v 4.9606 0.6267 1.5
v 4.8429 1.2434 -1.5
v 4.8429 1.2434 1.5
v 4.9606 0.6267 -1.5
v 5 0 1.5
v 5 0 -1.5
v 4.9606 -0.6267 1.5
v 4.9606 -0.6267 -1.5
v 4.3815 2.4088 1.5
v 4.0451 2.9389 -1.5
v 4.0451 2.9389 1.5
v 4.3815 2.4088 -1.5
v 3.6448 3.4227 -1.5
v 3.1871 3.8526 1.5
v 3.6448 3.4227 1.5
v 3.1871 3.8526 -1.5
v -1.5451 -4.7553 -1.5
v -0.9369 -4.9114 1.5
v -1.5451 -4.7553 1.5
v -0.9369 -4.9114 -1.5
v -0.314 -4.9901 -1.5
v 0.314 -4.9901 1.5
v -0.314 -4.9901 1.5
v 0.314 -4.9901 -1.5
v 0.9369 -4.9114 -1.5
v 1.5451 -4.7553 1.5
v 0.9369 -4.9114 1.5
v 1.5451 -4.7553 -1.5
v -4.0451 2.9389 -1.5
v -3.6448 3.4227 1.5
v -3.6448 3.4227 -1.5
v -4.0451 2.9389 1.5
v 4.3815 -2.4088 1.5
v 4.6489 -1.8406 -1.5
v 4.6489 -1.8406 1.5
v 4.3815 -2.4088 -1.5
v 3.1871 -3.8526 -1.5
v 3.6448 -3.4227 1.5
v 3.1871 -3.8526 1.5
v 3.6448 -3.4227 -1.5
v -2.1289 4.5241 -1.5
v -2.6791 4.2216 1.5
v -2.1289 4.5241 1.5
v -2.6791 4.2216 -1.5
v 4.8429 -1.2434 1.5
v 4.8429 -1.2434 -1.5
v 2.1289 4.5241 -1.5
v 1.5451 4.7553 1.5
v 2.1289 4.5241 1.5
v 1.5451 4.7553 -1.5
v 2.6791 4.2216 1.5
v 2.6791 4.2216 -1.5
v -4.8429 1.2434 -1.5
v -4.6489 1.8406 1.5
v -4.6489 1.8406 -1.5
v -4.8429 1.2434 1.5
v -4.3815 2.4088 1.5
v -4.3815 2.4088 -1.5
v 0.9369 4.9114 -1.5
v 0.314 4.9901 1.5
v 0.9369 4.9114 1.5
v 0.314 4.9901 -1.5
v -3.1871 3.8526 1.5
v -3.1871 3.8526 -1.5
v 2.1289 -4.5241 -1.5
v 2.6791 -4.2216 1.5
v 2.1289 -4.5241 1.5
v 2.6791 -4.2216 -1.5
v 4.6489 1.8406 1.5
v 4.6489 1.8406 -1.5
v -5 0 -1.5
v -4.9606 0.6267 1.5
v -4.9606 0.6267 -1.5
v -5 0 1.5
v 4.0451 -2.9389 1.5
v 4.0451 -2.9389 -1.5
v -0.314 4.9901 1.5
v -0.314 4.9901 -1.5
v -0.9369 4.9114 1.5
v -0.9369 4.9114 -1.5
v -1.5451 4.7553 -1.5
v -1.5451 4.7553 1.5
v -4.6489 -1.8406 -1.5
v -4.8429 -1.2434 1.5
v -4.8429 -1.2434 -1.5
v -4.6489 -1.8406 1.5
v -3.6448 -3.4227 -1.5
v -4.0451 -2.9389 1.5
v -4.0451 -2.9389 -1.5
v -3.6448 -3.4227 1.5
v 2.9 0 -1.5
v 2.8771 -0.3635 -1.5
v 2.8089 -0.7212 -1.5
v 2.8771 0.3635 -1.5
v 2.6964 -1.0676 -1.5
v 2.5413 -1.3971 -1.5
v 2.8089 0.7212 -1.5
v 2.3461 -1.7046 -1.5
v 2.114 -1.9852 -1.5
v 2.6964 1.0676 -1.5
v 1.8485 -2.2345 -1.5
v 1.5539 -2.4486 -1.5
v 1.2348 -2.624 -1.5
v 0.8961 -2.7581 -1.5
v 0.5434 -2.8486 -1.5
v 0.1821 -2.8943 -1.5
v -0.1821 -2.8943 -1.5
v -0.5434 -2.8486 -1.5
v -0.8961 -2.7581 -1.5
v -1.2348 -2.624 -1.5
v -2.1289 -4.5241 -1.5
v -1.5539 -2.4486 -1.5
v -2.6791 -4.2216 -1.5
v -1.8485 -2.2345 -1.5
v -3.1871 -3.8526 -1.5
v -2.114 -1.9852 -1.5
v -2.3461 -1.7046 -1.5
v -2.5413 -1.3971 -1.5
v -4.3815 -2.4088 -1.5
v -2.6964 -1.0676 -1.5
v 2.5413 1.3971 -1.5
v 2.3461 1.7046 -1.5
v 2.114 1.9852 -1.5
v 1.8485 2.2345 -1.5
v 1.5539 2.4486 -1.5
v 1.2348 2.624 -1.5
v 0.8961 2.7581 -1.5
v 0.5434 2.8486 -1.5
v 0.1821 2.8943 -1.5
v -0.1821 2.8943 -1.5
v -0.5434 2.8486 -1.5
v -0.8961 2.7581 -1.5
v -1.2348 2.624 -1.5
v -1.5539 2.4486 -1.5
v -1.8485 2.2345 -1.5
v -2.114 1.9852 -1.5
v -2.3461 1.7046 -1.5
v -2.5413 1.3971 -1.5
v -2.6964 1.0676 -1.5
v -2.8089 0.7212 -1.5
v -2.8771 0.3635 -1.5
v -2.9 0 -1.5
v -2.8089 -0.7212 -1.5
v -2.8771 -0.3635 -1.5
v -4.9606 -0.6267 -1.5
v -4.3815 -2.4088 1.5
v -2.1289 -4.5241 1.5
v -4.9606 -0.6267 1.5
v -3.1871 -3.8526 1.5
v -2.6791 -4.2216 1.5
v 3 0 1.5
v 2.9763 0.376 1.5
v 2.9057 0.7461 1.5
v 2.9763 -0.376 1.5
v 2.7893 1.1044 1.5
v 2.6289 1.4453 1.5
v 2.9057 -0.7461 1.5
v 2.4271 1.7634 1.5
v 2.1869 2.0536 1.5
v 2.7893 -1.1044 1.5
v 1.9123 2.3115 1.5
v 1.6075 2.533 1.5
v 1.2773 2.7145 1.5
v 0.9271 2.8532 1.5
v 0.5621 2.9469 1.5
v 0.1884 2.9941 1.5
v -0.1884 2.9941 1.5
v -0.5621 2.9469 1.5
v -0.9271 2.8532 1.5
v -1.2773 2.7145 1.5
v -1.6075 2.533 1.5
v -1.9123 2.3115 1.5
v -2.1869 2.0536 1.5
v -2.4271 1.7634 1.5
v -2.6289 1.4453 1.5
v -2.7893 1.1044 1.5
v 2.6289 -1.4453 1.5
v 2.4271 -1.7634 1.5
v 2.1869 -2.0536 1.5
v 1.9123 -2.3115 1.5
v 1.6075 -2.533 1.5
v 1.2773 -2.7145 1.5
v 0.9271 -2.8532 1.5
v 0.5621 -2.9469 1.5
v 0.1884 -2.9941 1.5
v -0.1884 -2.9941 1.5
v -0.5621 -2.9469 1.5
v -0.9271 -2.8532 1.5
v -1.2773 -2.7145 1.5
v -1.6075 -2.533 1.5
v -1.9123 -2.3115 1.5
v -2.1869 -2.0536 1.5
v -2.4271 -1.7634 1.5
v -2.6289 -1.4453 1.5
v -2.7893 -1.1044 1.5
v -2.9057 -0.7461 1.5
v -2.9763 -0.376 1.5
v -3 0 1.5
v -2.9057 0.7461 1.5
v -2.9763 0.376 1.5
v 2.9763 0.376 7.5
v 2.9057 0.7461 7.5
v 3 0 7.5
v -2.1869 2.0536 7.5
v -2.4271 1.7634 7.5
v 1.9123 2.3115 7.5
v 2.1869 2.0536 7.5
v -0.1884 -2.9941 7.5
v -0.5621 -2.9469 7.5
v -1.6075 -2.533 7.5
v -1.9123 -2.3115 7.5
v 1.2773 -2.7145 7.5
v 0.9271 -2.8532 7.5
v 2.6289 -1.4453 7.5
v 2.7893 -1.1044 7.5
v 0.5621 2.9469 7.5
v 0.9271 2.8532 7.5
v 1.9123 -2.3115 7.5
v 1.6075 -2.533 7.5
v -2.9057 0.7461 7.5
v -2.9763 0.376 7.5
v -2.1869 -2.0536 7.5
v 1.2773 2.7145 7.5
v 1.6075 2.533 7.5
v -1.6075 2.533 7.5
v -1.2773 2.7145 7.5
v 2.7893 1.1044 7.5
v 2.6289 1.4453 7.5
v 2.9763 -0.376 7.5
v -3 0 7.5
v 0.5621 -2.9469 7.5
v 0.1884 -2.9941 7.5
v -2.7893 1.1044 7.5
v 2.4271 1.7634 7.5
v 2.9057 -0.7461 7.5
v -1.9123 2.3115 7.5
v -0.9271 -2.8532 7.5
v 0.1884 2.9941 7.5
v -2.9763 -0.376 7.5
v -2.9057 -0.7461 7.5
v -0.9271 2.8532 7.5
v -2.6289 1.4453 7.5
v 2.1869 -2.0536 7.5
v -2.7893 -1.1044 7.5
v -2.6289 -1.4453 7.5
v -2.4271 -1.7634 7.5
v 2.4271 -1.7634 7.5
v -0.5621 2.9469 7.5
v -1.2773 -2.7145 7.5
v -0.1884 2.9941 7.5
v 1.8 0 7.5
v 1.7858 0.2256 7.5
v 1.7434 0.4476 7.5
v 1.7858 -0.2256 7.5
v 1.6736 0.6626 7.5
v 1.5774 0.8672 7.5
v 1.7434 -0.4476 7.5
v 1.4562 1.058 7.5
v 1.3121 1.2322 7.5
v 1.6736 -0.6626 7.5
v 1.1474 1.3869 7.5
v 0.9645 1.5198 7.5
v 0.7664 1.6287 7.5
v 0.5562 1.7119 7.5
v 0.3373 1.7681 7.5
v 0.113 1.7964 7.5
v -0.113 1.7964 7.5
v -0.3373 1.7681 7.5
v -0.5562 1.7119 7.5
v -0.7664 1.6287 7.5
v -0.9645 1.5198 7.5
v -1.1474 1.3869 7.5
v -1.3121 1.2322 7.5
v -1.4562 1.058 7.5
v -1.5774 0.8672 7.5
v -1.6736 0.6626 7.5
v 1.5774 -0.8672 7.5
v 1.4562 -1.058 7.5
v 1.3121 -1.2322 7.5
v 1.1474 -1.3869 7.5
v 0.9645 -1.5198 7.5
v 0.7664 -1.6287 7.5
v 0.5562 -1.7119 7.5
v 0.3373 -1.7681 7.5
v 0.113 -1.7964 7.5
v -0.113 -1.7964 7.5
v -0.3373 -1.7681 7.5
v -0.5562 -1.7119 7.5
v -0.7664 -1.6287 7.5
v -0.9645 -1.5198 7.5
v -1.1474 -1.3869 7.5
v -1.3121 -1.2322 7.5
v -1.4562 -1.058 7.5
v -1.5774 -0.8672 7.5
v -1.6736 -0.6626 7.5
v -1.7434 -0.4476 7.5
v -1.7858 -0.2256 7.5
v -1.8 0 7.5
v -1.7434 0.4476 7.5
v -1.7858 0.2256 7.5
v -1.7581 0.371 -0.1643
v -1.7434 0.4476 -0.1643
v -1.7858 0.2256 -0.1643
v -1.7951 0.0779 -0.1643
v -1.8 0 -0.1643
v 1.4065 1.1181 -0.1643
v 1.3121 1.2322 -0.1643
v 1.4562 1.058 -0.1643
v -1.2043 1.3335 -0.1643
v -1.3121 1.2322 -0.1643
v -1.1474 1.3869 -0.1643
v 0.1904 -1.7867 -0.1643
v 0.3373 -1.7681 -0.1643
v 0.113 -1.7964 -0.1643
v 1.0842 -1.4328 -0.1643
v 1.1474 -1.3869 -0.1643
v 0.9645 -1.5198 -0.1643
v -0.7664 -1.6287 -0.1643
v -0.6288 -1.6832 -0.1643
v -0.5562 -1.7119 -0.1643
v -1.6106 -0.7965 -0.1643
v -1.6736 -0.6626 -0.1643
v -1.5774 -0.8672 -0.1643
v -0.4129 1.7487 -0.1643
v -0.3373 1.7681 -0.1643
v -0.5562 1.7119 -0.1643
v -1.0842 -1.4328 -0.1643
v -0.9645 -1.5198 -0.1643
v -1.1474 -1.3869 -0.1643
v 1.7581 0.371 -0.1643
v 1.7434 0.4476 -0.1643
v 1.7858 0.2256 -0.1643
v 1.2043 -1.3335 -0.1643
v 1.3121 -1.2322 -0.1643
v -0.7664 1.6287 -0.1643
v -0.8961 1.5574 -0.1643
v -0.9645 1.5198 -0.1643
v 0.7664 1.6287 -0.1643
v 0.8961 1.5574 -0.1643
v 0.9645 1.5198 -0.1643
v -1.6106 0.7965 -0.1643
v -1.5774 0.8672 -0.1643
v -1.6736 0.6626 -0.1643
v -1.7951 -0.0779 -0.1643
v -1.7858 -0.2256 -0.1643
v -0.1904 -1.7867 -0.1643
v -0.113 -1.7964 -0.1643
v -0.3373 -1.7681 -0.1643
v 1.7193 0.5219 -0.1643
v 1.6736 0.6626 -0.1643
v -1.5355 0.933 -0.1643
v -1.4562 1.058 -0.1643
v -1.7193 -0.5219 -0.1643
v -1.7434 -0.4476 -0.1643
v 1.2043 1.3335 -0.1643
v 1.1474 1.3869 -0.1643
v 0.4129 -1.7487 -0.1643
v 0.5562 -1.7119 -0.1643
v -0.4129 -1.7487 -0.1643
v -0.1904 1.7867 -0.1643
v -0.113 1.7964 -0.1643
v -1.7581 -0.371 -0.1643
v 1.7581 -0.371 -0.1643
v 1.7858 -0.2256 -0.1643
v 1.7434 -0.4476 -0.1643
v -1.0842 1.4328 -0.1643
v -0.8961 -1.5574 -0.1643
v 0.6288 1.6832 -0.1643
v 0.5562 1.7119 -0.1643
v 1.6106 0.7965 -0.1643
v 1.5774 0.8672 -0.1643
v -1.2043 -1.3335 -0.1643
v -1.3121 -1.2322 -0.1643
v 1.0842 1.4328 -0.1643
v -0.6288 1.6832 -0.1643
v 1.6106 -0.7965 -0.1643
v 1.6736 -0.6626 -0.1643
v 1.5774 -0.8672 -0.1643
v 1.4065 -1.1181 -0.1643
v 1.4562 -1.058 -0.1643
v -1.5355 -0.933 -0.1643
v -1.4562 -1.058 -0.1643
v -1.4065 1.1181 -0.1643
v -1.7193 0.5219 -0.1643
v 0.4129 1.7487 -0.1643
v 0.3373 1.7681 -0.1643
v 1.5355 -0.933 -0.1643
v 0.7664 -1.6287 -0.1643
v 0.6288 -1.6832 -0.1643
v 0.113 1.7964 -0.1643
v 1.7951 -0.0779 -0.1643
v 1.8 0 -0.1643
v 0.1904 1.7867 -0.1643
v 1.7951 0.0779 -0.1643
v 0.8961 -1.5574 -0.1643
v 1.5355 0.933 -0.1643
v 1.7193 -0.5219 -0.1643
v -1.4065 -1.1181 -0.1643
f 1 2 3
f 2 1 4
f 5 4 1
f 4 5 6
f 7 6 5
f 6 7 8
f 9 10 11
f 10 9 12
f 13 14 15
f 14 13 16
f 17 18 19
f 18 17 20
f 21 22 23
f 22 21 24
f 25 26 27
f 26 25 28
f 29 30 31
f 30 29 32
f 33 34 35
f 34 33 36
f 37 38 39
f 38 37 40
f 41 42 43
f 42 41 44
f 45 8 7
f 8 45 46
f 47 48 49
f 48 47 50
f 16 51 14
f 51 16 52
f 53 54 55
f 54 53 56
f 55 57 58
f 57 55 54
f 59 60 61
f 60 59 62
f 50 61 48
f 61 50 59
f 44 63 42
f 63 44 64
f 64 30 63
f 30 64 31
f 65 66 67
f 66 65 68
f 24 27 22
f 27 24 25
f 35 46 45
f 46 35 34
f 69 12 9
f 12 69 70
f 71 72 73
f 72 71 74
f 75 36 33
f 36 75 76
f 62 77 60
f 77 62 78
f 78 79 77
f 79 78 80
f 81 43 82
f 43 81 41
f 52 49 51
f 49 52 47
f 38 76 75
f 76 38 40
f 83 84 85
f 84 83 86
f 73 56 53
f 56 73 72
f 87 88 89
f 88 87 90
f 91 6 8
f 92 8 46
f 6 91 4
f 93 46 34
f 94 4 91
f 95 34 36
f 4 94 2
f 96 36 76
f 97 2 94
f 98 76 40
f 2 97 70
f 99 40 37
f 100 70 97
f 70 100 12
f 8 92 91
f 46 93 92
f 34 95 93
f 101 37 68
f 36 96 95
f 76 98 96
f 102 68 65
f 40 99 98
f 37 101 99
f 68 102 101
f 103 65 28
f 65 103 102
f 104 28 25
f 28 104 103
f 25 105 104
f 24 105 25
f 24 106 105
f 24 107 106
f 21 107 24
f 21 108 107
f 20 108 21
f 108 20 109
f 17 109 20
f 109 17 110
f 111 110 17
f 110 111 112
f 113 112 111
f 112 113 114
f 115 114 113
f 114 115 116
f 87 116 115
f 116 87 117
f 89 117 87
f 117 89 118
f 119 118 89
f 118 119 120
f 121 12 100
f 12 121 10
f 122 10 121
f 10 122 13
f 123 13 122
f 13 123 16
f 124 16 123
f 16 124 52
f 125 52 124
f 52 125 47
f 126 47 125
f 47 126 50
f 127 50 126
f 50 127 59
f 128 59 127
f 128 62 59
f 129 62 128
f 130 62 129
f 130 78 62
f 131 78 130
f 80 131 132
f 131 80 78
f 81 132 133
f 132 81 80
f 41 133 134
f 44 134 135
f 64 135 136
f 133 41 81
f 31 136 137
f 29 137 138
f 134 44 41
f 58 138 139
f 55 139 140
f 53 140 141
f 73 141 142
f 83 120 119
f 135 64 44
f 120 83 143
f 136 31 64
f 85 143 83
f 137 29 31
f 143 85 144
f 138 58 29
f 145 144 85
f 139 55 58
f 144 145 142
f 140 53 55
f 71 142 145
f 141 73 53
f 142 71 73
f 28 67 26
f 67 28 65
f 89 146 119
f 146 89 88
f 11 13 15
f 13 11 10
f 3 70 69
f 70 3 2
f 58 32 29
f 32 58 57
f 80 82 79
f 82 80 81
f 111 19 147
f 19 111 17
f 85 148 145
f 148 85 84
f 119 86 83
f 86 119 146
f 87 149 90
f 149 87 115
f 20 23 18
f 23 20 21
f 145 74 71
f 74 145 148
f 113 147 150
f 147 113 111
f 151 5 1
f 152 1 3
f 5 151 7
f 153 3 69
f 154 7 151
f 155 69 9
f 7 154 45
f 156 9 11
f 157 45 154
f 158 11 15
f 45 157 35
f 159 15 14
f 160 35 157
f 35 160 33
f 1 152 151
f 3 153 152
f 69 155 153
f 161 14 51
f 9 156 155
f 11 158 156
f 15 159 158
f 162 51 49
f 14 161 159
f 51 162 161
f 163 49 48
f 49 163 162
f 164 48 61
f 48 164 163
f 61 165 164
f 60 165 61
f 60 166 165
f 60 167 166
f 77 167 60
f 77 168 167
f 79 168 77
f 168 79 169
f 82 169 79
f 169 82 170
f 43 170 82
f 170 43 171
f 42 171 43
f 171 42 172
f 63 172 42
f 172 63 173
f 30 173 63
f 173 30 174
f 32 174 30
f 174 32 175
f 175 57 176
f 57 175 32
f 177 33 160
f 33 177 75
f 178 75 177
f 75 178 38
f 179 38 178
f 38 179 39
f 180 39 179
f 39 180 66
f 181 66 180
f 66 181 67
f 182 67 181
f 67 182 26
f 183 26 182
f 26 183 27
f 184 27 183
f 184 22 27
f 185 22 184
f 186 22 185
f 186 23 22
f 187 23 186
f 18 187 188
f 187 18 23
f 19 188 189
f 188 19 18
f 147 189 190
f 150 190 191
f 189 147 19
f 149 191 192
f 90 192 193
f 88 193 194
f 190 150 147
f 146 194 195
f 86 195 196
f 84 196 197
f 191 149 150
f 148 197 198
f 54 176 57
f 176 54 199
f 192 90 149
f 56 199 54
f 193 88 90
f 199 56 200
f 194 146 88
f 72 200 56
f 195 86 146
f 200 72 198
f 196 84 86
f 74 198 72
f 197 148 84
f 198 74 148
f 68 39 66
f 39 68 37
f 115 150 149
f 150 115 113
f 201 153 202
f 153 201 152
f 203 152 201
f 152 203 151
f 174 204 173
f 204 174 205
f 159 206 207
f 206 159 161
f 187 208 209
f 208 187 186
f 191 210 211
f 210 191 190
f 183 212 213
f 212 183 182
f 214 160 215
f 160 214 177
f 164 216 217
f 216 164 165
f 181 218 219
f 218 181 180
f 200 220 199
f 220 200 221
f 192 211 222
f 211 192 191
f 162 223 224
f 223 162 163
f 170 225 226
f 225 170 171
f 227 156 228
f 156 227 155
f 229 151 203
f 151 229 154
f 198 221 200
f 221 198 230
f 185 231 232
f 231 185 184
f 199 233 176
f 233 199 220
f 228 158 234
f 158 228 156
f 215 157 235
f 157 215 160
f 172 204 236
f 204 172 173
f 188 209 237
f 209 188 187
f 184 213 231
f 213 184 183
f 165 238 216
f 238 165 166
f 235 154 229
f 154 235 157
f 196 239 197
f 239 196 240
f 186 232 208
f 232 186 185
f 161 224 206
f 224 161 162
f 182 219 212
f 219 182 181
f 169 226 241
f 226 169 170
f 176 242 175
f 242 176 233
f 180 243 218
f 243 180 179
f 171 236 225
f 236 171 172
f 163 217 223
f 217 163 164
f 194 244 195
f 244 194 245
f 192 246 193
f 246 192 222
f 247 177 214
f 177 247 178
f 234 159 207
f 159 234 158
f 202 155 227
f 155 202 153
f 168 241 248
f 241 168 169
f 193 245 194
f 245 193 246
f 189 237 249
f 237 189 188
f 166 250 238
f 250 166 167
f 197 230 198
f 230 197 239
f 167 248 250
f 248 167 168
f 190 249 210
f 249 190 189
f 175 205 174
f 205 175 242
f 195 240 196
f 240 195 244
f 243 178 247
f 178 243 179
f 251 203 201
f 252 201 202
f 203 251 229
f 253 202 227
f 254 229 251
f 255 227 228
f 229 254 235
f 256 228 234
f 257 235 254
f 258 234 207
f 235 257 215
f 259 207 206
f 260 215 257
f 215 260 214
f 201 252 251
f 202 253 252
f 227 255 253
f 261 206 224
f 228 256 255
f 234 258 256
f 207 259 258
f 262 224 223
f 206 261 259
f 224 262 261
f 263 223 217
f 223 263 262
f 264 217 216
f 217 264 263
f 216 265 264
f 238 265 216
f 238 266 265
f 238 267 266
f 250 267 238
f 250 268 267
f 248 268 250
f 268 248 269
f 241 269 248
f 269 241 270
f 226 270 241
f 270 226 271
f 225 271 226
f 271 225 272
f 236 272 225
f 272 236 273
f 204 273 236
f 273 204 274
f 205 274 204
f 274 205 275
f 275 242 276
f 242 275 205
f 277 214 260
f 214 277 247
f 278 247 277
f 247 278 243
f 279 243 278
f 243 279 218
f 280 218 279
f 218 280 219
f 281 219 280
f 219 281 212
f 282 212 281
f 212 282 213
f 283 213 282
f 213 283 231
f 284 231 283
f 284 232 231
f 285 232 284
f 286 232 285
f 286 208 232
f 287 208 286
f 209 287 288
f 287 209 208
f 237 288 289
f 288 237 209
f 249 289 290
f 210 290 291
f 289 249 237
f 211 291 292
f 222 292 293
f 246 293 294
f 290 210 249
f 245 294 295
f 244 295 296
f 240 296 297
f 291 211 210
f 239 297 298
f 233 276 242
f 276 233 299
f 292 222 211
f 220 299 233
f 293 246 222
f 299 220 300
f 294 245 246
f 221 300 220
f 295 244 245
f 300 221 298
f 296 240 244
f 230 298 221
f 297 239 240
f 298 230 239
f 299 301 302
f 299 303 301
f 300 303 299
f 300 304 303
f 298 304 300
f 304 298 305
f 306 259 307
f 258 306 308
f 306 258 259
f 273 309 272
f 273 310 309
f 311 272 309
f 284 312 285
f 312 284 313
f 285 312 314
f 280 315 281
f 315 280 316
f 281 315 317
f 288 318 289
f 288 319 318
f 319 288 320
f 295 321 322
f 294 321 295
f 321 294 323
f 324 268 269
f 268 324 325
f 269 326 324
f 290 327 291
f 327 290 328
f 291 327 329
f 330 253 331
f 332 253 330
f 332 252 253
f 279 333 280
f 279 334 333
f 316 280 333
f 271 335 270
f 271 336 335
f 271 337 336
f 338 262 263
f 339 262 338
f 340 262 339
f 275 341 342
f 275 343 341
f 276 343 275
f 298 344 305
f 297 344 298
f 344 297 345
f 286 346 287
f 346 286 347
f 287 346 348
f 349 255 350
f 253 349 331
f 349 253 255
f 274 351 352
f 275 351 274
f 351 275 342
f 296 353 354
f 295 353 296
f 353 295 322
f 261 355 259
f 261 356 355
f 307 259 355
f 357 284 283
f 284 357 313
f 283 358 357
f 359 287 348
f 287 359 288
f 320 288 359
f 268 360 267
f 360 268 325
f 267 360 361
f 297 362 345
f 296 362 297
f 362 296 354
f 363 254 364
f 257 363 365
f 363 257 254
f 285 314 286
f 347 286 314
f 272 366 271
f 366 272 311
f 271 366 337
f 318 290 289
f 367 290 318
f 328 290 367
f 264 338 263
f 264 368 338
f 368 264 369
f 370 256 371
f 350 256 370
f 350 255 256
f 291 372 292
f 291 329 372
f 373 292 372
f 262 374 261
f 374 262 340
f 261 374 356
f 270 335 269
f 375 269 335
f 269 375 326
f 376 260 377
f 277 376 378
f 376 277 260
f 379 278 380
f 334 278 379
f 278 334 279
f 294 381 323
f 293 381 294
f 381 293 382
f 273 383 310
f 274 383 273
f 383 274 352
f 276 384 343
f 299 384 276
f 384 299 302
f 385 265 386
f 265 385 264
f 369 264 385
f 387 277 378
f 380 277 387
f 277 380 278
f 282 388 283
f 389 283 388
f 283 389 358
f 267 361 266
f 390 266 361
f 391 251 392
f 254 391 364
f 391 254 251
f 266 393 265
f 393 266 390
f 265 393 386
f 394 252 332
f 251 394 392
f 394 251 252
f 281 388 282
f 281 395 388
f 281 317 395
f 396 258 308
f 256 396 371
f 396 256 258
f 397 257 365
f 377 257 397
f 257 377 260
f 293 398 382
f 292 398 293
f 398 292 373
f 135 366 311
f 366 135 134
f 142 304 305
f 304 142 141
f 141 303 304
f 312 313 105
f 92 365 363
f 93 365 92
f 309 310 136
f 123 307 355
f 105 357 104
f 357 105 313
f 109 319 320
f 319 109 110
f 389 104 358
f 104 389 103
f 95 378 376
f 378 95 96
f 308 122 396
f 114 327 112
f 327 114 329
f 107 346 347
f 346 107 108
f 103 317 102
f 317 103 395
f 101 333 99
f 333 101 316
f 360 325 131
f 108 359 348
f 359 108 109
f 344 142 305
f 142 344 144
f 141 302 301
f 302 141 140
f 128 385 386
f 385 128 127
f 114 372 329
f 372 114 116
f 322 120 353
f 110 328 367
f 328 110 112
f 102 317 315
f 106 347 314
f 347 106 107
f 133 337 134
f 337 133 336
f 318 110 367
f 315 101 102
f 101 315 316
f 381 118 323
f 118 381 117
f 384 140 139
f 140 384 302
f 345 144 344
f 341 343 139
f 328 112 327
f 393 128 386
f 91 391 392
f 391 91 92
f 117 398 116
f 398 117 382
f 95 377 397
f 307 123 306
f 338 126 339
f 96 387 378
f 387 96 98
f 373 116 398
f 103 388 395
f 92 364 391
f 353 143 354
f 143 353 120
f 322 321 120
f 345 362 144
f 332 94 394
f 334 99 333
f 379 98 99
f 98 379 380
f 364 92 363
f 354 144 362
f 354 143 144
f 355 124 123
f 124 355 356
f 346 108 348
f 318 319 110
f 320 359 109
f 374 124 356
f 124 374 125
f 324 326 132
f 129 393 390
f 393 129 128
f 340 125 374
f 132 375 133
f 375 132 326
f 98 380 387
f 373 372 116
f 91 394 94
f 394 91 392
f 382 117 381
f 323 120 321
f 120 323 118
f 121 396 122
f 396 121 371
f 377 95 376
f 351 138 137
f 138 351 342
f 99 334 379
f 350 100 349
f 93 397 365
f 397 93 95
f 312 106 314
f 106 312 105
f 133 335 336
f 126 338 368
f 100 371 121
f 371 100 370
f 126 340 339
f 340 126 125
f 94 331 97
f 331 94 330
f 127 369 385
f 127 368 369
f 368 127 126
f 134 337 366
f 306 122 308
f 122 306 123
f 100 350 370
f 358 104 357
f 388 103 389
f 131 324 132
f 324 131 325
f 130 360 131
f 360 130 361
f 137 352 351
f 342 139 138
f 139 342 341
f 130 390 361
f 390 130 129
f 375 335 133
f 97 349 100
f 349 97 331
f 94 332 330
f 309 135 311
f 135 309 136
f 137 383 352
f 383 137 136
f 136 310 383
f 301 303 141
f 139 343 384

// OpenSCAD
$fn = 50;


difference() {
	union() {
		translate(v = [0, 0, -1.5000000000]) {
			cylinder(h = 3, r = 5.0000000000);
		}
		translate(v = [0, 0, -1.5000000000]) {
			cylinder(h = 9, r = 3.0000000000);
		}
	}
	union() {
		translate(v = [0, 0, -1.5000000000]) {
			rotate(a = [0, 180, 0]) {
				difference() {
					union() {
						translate(v = [0, 0, -9.0000000000]) {
							cylinder(h = 9, r = 1.5000000000);
						}
						translate(v = [0, 0, -9.0000000000]) {
							cylinder(h = 9, r = 1.8000000000);
						}
						translate(v = [0, 0, -1.7000000000]) {
							cylinder(h = 1.7000000000, r1 = 1.5000000000, r2 = 2.9000000000);
						}
						translate(v = [0, 0, -9.0000000000]) {
							cylinder(h = 9, r = 1.5000000000);
						}
					}
					union();
				}
			}
		}
		translate(v = [0, 0, -50.0000000000]) {
			cylinder(h = 100, r = 1.5000000000);
		}
	}
}
